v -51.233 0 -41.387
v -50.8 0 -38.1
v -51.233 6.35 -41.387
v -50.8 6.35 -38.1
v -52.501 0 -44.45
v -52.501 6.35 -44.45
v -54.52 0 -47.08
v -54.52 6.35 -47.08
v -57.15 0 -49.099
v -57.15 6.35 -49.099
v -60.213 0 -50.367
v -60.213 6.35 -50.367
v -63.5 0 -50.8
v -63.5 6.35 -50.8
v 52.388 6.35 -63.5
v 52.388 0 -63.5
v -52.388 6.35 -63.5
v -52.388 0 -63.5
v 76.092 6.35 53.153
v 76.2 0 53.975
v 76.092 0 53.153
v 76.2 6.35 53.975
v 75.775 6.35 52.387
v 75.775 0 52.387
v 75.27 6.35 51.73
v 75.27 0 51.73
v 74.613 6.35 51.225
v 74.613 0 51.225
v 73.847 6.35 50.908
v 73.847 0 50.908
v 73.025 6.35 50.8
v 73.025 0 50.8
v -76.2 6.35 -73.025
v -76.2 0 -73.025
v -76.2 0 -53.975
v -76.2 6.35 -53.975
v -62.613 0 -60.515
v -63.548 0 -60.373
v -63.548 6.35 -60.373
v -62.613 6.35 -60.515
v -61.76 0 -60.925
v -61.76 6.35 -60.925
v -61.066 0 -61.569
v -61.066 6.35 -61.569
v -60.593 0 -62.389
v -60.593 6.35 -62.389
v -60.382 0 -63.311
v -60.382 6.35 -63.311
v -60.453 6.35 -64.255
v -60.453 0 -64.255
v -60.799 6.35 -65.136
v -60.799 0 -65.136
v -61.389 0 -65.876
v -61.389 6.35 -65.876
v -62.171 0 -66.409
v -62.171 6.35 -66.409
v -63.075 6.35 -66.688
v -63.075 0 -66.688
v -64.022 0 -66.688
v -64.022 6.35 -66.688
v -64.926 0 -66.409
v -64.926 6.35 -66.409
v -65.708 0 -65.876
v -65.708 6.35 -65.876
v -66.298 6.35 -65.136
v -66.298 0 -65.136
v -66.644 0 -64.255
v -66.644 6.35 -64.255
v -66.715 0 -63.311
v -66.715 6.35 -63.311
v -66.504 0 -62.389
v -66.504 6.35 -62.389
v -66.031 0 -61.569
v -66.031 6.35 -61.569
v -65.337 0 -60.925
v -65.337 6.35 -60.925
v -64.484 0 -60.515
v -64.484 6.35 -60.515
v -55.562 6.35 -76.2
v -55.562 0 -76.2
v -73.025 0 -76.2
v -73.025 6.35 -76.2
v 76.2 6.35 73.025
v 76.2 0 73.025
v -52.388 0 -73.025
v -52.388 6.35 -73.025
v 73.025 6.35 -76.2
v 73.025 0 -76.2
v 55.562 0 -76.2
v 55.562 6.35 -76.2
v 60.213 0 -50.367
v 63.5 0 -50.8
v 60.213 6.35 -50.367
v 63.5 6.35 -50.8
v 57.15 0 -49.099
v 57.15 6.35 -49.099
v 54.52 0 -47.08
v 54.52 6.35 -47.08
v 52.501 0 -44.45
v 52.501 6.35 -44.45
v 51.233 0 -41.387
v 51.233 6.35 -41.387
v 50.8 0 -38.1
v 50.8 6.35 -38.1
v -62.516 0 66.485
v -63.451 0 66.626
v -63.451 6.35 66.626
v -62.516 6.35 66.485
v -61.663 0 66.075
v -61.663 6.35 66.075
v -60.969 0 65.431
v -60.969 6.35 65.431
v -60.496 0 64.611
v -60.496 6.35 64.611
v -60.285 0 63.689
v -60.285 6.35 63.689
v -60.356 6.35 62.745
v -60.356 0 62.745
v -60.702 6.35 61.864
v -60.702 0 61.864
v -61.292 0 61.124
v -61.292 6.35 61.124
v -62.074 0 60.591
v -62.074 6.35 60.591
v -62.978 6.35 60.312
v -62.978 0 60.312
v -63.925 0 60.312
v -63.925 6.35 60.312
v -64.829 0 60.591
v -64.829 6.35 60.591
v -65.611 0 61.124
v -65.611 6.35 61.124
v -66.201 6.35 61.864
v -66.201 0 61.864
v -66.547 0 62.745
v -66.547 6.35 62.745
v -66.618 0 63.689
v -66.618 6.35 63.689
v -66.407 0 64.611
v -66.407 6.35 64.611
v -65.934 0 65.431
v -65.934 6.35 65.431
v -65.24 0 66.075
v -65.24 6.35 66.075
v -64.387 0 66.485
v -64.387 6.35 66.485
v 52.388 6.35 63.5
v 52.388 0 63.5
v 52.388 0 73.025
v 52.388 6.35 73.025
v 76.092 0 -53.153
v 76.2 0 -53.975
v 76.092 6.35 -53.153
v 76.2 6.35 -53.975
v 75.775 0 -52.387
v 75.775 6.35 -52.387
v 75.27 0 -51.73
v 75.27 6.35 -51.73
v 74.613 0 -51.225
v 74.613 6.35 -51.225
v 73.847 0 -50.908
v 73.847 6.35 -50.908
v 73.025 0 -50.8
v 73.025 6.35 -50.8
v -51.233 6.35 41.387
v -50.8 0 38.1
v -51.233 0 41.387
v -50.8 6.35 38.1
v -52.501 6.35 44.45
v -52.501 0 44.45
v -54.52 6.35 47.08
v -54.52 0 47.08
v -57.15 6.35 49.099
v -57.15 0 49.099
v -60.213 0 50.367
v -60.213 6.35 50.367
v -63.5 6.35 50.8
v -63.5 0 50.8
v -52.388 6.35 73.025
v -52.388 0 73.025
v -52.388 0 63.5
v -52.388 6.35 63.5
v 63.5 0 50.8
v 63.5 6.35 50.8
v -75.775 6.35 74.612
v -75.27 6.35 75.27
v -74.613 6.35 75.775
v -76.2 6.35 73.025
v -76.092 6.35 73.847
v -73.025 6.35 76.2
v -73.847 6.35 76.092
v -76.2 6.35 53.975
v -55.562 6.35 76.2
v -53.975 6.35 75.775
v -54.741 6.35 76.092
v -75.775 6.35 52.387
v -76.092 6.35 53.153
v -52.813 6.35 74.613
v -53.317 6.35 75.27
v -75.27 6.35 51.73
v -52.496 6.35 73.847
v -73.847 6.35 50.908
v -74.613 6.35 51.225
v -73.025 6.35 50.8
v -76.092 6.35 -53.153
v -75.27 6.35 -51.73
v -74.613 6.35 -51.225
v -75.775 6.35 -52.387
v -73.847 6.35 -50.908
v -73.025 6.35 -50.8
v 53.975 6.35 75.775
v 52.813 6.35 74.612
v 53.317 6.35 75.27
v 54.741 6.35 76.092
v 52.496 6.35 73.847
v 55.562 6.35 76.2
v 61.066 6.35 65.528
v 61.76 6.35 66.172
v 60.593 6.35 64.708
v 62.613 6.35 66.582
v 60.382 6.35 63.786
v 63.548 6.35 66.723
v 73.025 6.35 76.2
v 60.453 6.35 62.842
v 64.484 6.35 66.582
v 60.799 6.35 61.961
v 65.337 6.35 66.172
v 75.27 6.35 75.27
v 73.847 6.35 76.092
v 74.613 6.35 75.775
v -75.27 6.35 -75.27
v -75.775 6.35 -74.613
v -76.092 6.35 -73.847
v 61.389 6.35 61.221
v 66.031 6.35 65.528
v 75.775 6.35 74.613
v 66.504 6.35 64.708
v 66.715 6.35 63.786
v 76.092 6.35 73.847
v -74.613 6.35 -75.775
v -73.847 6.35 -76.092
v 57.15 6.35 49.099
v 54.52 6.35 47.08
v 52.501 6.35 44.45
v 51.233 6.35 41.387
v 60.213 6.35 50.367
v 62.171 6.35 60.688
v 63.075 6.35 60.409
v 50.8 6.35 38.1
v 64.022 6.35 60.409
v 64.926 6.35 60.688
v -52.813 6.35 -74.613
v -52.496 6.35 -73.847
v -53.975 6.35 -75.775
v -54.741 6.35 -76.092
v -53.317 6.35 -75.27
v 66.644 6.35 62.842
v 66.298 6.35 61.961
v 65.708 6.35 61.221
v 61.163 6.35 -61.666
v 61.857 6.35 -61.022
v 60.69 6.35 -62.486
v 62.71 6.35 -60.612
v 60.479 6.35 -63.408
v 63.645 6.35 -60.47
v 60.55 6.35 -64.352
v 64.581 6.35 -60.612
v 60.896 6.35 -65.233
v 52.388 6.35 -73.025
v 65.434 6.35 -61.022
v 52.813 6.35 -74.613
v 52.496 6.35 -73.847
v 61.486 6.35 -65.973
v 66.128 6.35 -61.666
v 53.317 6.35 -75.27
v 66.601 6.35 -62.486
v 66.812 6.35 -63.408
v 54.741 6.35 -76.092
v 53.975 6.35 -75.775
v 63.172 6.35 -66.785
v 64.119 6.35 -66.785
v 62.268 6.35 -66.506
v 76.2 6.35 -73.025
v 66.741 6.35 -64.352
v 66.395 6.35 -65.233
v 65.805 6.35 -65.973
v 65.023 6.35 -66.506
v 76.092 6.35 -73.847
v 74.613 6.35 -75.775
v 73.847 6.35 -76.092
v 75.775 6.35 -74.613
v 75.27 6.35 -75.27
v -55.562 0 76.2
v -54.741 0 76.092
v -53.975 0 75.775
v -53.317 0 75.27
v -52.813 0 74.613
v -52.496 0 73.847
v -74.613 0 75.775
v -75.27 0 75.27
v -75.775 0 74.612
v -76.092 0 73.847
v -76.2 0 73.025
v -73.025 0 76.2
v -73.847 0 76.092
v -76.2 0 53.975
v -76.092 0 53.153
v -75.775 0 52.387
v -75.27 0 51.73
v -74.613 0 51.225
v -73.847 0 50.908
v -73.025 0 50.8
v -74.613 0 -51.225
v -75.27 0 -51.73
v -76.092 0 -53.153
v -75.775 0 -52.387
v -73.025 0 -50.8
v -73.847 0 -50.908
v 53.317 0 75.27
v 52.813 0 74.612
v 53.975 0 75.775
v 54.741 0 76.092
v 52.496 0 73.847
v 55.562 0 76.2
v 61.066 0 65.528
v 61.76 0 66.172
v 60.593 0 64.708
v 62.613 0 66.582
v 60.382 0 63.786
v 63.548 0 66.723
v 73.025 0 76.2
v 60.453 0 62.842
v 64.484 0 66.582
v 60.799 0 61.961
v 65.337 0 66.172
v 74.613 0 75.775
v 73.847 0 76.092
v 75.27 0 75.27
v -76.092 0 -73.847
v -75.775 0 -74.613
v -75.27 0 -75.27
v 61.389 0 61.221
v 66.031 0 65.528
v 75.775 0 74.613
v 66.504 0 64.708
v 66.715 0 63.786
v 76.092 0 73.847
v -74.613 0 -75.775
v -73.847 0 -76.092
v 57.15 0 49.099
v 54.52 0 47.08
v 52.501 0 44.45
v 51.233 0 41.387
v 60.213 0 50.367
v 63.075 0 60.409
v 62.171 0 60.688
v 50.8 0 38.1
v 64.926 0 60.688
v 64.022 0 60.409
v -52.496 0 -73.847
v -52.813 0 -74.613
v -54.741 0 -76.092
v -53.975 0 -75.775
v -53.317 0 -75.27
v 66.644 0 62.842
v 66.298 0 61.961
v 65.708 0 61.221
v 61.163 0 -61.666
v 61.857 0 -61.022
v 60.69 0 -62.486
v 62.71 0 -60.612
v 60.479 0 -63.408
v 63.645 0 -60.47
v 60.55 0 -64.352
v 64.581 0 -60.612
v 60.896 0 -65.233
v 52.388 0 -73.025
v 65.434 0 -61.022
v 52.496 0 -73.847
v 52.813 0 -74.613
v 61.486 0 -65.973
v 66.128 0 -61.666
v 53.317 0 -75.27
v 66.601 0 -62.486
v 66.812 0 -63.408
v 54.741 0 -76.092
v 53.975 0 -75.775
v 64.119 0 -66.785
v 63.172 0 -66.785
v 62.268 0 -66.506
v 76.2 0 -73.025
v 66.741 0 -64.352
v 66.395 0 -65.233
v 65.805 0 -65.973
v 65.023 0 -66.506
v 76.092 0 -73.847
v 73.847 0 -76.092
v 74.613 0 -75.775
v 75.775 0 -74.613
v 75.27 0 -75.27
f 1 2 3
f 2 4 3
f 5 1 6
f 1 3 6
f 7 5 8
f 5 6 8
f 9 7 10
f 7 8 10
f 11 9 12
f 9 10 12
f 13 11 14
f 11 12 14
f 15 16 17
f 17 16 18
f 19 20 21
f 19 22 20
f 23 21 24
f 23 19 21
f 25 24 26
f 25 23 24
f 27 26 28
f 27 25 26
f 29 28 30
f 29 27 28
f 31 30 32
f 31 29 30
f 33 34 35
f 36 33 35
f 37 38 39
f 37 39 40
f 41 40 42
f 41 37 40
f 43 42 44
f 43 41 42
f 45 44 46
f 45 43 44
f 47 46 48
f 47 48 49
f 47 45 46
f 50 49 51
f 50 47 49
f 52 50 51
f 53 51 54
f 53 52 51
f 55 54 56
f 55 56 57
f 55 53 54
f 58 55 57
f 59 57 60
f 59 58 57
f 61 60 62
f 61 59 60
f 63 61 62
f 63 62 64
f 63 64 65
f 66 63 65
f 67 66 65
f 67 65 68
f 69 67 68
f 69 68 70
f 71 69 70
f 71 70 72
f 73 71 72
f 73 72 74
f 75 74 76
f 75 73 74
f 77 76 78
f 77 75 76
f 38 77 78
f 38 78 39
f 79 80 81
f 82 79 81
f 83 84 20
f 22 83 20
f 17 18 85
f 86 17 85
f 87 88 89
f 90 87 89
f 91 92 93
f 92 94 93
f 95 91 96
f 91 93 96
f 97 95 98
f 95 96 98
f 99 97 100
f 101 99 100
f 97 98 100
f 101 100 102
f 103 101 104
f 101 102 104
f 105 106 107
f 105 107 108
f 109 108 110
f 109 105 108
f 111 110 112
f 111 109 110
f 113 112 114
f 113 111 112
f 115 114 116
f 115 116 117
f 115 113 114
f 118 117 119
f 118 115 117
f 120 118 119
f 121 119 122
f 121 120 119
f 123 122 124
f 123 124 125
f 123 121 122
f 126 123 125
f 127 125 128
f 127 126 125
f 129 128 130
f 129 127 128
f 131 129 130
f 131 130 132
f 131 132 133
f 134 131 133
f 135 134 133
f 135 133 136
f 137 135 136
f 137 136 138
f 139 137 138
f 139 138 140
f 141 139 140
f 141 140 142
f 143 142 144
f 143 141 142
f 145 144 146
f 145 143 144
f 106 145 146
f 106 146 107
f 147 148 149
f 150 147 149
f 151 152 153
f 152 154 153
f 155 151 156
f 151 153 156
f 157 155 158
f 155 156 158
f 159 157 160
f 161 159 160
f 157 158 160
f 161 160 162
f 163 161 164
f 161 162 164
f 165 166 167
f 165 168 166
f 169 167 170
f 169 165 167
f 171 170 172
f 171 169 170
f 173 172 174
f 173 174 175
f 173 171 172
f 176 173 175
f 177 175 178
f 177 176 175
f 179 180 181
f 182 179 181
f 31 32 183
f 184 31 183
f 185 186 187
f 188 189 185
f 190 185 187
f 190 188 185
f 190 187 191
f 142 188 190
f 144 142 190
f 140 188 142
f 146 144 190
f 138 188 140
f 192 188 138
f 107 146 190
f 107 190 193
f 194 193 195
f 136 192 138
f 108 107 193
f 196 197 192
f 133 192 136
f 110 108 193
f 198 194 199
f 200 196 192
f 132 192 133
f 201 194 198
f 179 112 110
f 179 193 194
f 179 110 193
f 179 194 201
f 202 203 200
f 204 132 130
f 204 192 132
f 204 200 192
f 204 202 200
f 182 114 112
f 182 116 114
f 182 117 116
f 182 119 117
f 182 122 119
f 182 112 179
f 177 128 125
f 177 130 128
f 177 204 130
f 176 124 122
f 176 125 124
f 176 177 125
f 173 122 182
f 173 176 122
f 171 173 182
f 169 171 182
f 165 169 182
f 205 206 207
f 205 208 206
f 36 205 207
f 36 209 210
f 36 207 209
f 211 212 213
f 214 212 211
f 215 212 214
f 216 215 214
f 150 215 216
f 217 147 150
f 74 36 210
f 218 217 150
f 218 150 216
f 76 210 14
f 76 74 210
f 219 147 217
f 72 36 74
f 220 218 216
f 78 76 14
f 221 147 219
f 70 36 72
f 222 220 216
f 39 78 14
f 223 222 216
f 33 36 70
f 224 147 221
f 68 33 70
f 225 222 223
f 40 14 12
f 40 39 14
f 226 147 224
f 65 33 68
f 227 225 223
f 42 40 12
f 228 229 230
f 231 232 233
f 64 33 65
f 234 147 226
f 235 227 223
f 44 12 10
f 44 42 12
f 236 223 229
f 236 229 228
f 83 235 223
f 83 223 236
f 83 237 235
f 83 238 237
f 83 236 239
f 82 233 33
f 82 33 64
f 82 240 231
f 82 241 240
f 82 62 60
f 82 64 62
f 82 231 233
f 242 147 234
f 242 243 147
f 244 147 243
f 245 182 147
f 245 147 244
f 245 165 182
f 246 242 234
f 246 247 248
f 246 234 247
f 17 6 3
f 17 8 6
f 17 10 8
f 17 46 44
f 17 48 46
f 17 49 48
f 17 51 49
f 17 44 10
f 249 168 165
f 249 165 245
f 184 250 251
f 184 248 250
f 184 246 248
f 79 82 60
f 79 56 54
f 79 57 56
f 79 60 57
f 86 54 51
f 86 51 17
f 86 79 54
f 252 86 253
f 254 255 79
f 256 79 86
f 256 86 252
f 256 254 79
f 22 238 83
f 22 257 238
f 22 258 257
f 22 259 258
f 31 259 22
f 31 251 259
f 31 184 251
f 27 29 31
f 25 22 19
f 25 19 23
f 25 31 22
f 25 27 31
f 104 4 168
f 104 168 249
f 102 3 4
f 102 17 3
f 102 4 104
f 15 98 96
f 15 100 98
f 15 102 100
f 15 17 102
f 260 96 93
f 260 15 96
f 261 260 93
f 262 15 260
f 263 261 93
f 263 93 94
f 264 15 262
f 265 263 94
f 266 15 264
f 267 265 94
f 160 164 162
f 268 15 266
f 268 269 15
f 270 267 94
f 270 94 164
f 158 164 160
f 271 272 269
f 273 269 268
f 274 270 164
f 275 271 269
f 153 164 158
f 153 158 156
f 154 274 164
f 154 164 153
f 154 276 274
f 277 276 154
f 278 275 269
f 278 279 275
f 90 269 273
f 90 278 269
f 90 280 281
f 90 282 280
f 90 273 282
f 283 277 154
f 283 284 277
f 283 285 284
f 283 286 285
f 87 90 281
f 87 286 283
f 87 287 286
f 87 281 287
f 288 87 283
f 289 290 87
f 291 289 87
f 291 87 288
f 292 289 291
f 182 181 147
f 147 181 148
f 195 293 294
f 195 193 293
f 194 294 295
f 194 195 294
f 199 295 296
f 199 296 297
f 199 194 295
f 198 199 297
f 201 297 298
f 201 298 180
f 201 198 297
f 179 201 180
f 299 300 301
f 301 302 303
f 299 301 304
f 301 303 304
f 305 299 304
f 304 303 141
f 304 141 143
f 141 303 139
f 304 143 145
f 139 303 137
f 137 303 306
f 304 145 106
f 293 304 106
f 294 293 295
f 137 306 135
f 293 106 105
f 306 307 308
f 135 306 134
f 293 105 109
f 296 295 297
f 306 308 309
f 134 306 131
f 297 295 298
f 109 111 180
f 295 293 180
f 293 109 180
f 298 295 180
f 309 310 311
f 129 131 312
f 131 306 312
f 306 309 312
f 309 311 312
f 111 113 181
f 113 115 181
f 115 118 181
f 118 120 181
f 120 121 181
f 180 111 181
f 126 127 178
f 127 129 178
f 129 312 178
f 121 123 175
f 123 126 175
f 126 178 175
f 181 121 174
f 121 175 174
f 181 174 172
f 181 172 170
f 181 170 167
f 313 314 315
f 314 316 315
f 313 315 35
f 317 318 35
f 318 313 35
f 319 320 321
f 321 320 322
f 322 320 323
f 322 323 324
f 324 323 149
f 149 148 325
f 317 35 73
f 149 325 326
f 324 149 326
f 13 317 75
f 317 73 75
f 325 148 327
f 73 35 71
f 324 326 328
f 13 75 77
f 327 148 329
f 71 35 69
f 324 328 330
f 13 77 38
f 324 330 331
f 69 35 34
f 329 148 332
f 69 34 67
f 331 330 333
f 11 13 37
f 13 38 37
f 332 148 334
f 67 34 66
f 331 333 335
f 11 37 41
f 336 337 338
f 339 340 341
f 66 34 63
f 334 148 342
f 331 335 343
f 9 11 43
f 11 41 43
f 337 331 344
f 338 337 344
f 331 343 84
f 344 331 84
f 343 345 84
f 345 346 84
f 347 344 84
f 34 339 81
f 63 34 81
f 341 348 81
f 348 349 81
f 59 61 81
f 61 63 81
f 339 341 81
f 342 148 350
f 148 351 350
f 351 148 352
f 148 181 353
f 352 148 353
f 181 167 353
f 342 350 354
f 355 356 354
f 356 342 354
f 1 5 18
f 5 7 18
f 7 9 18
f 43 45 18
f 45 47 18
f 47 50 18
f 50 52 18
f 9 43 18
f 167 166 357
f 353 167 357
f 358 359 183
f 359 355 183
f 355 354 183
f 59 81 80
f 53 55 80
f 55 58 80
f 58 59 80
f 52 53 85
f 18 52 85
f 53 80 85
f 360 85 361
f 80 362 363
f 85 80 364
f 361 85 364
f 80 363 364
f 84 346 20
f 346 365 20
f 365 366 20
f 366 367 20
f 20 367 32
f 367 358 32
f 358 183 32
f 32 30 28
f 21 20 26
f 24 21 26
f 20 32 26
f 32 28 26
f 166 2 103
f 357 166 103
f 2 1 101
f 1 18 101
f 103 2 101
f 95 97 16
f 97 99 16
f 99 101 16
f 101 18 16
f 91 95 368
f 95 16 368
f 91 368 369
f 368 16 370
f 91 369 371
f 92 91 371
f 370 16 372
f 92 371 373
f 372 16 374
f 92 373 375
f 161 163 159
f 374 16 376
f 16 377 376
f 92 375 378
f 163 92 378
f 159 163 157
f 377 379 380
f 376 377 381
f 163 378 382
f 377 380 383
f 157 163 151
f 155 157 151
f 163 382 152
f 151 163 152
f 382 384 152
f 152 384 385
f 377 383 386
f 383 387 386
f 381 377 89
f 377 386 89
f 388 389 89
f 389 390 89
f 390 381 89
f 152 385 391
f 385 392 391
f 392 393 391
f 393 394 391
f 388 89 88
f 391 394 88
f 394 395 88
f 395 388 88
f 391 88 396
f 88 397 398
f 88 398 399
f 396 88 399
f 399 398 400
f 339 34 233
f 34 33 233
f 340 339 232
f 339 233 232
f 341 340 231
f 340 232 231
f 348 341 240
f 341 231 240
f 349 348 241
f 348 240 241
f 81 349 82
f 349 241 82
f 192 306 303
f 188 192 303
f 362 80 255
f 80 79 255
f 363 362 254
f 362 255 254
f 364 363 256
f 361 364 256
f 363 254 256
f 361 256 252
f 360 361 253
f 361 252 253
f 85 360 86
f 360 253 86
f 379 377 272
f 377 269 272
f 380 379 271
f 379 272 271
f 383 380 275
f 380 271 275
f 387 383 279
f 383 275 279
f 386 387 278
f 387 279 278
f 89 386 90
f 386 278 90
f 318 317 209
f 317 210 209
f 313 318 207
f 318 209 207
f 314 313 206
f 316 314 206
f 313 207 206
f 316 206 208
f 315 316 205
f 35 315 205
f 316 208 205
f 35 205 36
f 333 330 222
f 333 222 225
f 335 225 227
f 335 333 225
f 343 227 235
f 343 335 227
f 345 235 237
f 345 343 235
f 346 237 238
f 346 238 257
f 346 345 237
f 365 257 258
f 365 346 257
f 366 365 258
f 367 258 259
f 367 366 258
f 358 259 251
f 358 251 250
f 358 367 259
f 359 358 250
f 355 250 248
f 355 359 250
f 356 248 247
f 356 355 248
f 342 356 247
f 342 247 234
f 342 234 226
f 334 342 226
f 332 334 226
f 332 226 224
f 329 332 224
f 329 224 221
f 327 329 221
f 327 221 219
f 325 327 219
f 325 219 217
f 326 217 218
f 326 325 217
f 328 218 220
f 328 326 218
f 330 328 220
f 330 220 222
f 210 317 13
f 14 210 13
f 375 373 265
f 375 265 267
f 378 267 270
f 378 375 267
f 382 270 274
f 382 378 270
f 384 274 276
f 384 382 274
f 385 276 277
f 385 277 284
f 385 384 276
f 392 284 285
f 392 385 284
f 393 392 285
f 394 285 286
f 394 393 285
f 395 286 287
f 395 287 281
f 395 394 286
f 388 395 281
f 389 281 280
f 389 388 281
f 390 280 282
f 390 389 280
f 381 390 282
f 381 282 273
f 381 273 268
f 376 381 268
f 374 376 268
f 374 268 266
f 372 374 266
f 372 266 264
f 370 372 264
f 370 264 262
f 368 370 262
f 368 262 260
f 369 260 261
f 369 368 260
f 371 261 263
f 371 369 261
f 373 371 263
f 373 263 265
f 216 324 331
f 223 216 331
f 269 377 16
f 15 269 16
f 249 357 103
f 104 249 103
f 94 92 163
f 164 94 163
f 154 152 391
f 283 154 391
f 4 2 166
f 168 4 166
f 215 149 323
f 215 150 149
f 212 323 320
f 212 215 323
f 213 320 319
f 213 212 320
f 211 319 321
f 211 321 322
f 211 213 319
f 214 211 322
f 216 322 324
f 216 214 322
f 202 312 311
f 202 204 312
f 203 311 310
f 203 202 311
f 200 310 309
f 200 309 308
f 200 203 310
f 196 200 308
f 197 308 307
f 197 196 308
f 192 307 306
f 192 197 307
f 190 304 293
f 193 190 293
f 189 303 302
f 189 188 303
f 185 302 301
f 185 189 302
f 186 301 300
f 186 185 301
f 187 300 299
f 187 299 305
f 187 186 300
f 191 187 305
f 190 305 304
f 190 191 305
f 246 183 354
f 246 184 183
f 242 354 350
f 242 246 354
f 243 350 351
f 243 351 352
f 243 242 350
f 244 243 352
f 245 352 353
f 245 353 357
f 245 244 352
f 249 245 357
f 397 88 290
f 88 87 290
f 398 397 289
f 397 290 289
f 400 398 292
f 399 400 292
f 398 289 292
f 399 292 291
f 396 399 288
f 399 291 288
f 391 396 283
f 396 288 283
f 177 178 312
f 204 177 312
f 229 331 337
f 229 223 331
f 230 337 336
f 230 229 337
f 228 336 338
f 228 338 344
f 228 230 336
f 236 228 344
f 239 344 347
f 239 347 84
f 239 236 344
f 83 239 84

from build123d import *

# Parameters (mm, degrees)
SKETCH1_R           = 3.175
BOSS_EXTRUDE1_DEPTH = 6.35
FILLET1_R           = 12.7
FILLET2_R           = 3.175


with BuildPart() as part:
    # Sketch1 → Boss-Extrude1 (new body)
    with BuildSketch(Plane(origin=(0, 0, 0), x_dir=(1, 0, 0), z_dir=(0, 1, 0))):
        Polygon((-50.8, 50.8), (-50.8, -50.8), (-76.2, -50.8), (-76.2, -76.2), (-52.3875, -76.2), (-52.3875, -63.5), (52.3875, -63.5), (52.3875, -76.2), (76.2, -76.2), (76.2, -50.8), (50.8, -50.8), (50.8, 50.8), (76.2, 50.8), (76.2, 76.2), (52.3875, 76.2), (52.3875, 63.5), (-52.3875, 63.5), (-52.3875, 76.2), (-76.2, 76.2), (-76.2, 50.8), align=None)
        with Locations(Location((-63.54848247, 63.54848247, 0), (0, 0, 270))):
            Circle(SKETCH1_R, mode=Mode.SUBTRACT)
        with Locations(Location((63.645484454, 63.645484454, 0), (0, 0, 270))):
            Circle(SKETCH1_R, mode=Mode.SUBTRACT)
        with Locations(Location((63.54848247, -63.54848247, 0), (0, 0, 270))):
            Circle(SKETCH1_R, mode=Mode.SUBTRACT)
        with Locations(Location((-63.451480485, -63.451480485, 0), (0, 0, 270))):
            Circle(SKETCH1_R, mode=Mode.SUBTRACT)
    extrude(amount=BOSS_EXTRUDE1_DEPTH)

    # Fillet1
    fillet1_edges = [part.edges().sort_by_distance(p)[0] for p in [
        (50.8, 3.175, -50.8),
        (50.8, 3.175, 50.8),
        (-50.8, 3.175, 50.8),
        (-50.8, 3.175, -50.8),
    ]]
    fillet(fillet1_edges, radius=FILLET1_R)

    # Fillet2
    fillet2_edges = [part.edges().sort_by_distance(p)[0] for p in [
        (-76.2, 3.175, -76.2),
        (-52.3875, 3.175, -76.2),
        (52.3875, 3.175, -76.2),
        (76.2, 3.175, -76.2),
        (76.2, 3.175, -50.8),
        (76.2, 3.175, 50.8),
        (76.2, 3.175, 76.2),
        (52.3875, 3.175, 76.2),
        (-52.3875, 3.175, 76.2),
        (-76.2, 3.175, 76.2),
        (-76.2, 3.175, 50.8),
        (-76.2, 3.175, -50.8),
    ]]
    fillet(fillet2_edges, radius=FILLET2_R)


solid = part.part
